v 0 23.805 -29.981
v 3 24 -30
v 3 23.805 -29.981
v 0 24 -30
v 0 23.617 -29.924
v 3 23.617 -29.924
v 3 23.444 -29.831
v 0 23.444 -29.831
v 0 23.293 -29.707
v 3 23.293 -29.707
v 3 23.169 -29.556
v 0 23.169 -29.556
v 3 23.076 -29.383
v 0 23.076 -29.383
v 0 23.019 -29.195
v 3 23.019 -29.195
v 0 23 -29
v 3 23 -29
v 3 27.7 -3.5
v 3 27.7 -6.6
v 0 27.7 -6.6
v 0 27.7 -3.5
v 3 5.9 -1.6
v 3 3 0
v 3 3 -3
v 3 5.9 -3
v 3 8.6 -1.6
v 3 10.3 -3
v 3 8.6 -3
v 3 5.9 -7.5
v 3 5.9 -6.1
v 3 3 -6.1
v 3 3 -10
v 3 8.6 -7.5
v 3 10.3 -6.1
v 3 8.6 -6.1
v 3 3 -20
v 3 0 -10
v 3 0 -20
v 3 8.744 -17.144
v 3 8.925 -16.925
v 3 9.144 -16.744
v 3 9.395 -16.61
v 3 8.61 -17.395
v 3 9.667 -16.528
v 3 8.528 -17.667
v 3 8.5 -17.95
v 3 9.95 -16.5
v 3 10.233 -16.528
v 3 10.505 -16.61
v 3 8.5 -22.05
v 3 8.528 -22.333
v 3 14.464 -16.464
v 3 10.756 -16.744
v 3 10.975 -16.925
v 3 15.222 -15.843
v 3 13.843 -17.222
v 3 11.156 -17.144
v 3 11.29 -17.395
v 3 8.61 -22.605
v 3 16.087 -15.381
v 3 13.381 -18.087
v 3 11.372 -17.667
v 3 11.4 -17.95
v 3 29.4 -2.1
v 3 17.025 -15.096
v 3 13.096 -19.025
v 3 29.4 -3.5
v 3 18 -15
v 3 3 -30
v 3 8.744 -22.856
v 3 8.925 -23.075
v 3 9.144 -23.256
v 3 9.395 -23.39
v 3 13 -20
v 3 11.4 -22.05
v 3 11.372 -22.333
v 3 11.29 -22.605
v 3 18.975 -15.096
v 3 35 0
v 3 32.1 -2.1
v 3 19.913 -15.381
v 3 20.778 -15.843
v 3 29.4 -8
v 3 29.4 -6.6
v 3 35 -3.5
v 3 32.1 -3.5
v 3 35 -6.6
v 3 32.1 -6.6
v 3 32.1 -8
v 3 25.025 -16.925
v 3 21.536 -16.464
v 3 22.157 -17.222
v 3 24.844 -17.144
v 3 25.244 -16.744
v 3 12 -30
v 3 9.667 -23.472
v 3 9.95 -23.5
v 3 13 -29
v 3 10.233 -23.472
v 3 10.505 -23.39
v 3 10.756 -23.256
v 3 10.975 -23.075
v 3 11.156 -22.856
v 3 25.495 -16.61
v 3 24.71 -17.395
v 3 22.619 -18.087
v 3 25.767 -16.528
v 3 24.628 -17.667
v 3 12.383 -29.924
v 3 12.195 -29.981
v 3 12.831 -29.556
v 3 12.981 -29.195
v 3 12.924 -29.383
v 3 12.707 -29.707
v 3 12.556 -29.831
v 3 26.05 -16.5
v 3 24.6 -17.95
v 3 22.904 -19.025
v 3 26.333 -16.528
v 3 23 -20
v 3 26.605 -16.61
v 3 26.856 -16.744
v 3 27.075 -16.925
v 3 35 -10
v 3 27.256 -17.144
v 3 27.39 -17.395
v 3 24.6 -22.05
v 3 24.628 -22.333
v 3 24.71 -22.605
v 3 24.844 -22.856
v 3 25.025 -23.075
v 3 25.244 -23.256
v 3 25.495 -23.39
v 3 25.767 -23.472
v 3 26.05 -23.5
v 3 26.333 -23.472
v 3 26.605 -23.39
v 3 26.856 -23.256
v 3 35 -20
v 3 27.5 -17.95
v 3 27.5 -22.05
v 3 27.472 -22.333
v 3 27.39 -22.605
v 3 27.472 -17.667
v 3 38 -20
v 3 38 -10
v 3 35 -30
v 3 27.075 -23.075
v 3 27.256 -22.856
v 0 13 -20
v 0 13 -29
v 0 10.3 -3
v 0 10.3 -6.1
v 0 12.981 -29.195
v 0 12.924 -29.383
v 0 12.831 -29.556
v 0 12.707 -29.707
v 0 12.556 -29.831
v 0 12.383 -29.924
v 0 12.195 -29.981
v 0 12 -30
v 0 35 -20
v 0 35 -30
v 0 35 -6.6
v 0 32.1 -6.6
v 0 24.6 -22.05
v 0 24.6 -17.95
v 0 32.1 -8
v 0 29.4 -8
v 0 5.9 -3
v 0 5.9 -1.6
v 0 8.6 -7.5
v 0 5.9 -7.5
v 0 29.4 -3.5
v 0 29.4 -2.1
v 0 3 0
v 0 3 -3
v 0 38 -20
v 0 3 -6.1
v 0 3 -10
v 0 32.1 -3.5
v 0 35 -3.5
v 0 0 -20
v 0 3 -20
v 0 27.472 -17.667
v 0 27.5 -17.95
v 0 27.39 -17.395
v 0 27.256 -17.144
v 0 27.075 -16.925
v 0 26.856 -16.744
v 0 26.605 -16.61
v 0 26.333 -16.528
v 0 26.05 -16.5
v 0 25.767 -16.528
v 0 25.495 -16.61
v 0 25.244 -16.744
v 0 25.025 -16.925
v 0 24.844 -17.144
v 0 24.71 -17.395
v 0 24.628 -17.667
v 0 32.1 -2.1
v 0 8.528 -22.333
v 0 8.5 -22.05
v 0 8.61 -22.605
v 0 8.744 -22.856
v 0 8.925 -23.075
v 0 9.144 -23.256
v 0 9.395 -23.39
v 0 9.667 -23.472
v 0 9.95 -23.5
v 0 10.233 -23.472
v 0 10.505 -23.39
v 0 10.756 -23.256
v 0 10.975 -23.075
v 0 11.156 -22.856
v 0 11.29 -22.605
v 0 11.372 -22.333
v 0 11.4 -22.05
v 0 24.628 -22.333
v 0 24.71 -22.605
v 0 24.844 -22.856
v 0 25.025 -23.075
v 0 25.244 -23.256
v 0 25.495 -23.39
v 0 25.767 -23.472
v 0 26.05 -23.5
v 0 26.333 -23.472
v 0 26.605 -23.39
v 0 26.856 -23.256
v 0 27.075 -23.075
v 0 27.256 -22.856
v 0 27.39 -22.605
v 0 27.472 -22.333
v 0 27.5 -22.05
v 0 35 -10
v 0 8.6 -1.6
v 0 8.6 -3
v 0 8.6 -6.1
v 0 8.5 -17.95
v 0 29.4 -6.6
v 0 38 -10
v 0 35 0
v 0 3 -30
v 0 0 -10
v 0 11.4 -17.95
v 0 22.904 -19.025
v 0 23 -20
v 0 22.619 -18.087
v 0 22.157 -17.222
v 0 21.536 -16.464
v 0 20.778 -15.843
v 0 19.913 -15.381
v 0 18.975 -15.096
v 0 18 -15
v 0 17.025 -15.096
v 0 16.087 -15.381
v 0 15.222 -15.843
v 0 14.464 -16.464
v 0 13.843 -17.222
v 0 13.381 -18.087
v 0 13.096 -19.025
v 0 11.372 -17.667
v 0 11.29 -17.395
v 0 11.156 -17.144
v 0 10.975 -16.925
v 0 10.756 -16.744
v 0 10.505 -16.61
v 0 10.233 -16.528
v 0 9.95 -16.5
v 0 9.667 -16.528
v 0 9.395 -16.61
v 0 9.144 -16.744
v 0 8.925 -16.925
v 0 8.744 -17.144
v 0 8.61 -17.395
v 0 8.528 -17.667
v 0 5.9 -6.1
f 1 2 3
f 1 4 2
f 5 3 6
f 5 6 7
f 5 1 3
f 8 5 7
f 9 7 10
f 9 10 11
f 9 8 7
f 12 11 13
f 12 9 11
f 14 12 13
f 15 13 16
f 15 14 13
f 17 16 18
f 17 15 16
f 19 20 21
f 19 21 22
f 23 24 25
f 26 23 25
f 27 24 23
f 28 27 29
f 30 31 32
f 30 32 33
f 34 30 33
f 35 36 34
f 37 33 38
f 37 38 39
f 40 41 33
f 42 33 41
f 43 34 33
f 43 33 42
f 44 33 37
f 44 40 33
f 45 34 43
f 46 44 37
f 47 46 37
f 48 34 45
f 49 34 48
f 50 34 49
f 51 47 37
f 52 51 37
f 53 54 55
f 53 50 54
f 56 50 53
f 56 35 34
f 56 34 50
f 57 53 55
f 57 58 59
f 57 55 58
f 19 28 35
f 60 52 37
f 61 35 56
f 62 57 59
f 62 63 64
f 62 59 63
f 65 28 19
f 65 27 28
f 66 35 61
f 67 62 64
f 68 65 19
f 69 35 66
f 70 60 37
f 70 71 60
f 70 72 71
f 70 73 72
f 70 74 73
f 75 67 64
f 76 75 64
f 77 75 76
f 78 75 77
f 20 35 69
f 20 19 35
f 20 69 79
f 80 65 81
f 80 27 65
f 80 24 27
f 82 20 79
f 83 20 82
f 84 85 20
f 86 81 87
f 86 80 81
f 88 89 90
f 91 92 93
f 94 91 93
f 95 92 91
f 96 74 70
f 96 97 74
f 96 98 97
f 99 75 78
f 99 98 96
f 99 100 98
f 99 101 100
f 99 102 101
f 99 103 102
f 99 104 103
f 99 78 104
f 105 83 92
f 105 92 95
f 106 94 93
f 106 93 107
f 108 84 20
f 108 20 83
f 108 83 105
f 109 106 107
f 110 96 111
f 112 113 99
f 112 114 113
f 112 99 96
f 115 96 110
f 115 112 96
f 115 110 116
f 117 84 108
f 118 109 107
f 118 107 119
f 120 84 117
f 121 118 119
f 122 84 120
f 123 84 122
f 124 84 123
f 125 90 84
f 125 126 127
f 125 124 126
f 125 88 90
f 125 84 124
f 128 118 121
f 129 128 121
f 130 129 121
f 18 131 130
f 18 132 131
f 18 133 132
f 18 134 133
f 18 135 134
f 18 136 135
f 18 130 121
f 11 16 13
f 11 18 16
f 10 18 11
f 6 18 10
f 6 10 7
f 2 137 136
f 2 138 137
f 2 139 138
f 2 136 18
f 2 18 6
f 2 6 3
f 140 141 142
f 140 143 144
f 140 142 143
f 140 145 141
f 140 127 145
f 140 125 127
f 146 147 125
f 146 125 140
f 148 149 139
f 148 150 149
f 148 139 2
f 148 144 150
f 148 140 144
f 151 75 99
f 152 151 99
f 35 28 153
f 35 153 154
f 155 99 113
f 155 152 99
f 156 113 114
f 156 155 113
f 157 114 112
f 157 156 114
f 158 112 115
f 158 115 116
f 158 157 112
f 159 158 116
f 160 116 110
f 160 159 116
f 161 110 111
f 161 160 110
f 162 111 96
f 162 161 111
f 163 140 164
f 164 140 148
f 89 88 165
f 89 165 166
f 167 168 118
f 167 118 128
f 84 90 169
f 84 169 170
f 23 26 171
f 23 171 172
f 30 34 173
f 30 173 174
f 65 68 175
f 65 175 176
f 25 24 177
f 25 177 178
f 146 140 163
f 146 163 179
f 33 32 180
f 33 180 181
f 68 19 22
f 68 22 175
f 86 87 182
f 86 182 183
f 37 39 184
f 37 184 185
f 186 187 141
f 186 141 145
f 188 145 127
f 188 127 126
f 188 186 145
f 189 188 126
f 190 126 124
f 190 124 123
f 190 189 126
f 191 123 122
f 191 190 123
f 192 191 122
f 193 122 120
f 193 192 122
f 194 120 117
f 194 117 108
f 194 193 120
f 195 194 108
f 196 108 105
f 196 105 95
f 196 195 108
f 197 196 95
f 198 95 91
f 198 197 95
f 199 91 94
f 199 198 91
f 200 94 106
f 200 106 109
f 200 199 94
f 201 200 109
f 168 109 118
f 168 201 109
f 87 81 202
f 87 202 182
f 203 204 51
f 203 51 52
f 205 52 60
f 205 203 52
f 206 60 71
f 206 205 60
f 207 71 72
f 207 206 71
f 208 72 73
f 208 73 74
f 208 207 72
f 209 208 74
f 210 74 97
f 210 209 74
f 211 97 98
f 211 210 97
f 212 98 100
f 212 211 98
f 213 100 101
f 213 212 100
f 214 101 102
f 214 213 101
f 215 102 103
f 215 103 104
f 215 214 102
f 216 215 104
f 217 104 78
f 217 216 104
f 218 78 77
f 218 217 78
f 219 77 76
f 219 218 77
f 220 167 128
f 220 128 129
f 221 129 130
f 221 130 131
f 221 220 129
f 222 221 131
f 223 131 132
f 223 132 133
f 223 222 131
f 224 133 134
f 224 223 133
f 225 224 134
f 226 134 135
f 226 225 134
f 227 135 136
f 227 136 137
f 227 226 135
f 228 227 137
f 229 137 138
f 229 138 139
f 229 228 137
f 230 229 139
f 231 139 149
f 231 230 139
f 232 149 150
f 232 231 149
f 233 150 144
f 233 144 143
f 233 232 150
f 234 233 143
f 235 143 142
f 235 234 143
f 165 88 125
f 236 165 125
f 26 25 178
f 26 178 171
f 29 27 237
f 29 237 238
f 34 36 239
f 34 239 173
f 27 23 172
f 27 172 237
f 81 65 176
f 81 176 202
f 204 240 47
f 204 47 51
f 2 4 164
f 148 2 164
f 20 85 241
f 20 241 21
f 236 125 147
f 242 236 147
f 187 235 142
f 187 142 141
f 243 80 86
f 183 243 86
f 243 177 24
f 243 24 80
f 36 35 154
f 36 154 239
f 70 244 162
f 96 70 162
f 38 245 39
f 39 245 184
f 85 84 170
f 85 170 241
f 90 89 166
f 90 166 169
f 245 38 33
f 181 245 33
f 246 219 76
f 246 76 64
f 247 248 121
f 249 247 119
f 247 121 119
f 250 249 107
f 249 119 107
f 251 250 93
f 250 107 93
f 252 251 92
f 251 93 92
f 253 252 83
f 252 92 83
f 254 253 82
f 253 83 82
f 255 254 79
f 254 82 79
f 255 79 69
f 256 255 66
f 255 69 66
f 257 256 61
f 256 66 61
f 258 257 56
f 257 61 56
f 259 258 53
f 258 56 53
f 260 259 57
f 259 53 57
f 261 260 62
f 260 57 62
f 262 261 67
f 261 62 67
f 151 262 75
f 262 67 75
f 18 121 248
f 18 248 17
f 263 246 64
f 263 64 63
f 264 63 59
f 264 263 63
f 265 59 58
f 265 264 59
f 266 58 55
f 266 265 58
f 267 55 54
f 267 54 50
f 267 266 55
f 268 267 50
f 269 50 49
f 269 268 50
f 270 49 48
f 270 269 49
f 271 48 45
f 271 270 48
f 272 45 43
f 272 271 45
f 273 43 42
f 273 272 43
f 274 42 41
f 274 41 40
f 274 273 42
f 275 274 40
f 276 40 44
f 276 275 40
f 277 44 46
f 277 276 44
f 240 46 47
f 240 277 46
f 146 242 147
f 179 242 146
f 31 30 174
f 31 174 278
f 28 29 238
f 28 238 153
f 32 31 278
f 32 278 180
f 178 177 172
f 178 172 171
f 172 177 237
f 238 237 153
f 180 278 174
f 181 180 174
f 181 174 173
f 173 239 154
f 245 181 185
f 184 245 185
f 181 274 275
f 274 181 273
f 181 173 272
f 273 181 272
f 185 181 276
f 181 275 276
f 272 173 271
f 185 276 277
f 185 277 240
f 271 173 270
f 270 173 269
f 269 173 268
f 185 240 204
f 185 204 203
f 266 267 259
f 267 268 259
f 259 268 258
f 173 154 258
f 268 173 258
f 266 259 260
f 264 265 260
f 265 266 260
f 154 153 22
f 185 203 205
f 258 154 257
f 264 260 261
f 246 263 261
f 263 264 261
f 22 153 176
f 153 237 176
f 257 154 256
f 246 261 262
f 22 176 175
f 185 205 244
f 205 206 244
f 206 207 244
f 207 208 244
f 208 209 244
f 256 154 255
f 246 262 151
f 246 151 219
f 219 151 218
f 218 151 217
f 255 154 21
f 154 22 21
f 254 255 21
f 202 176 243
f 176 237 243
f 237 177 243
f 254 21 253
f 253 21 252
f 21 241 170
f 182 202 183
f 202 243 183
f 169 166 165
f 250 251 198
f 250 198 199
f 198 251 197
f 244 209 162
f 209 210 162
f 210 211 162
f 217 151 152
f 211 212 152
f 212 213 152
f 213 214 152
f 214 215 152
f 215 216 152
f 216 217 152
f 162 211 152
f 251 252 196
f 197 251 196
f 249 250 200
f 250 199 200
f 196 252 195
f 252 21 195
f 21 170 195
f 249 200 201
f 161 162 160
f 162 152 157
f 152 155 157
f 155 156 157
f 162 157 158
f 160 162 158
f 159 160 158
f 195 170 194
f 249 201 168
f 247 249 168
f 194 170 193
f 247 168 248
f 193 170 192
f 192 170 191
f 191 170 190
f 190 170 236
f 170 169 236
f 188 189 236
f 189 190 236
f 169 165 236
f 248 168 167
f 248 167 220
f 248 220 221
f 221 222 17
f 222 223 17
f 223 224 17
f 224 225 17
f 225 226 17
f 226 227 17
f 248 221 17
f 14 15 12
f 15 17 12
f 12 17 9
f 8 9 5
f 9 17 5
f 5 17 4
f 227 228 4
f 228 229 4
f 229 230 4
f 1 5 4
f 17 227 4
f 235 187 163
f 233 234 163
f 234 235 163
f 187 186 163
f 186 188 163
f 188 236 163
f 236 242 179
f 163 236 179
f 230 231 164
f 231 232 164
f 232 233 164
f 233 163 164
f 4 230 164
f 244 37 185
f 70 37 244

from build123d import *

# Parameters (mm, degrees)
SKETCH1_W                  = 30
SKETCH1_H                  = 38
BOSS_EXTRUDE1_DEPTH        = 3
SKETCH2_R                  = 5
CUT_EXTRUDE1_DEPTH         = 3
SKETCH6_W                  = 10
SKETCH6_H                  = 3
CUT_EXTRUDE2_DEPTH         = 3
CUT_EXTRUDE3_DEPTH         = 3
SKETCH9_W                  = 10
SKETCH9_H                  = 3
CUT_EXTRUDE5_DEPTH         = 10
CUT_EXTRUDE6_DEPTH         = 10
M2_5_CLEARANCE_SLOT1_DEPTH = 3
SKETCH17_W                 = 10
SKETCH17_H                 = 10
CUT_EXTRUDE7_DEPTH         = 10
FILLET1_R                  = 1


# Read off the part's stored shape, not the designer's step: M2.5 Clearance Slot1
with BuildPart() as part:
    # Sketch1 → Boss-Extrude1 (new body)
    with BuildSketch(Plane(origin=(0, 0, 0), x_dir=(0, 0, -1), z_dir=(1, 0, 0))):
        with Locations((15, 19)):
            Rectangle(SKETCH1_W, SKETCH1_H)
    extrude(amount=BOSS_EXTRUDE1_DEPTH)

    # Sketch2 → Cut-Extrude1 (cut)
    with BuildSketch(Plane(origin=(3, 0, 0), x_dir=(0, 0, -1), z_dir=(1, 0, 0))):
        with Locations((20, 18)):
            Circle(SKETCH2_R)
    extrude(amount=-CUT_EXTRUDE1_DEPTH, mode=Mode.SUBTRACT)

    # Sketch6 → Cut-Extrude2 (cut)
    with BuildSketch(Plane(origin=(3, 0, 0), x_dir=(0, 0, -1), z_dir=(1, 0, 0))):
        with Locations((5, 1.5)):
            Rectangle(SKETCH6_W, SKETCH6_H)
        with Locations((25, 1.5)):
            Rectangle(SKETCH6_W, SKETCH6_H)
    extrude(amount=-CUT_EXTRUDE2_DEPTH, mode=Mode.SUBTRACT)

    # Sketch7 → Cut-Extrude3 (cut)
    with BuildSketch(Plane(origin=(3, 0, 0), x_dir=(0, 0, -1), z_dir=(1, 0, 0))):
        Polygon((3, 3), (3, 5.9), (1.6, 5.9), (1.6, 8.6), (3, 8.6), (3, 10.3), (6.1, 10.3), (6.1, 8.6), (7.5, 8.6), (7.5, 5.9), (6.1, 5.9), (6.1, 3), align=None)
    extrude(amount=-CUT_EXTRUDE3_DEPTH, mode=Mode.SUBTRACT)

    # Sketch9 → Cut-Extrude5 (cut)
    with BuildSketch(Plane(origin=(3, 0, 0), x_dir=(0, 0, -1), z_dir=(1, 0, 0))):
        with Locations((5, 36.5)):
            Rectangle(SKETCH9_W, SKETCH9_H)
        with Locations((25, 36.5)):
            Rectangle(SKETCH9_W, SKETCH9_H)
    extrude(amount=-CUT_EXTRUDE5_DEPTH, mode=Mode.SUBTRACT)

    # Sketch12 → Cut-Extrude6 (cut)
    with BuildSketch(Plane(origin=(3, 0, 0), x_dir=(0, 0, -1), z_dir=(1, 0, 0))):
        Polygon((6.6, 35), (6.6, 32.1), (8, 32.1), (8, 29.4), (6.6, 29.4), (6.6, 27.7), (3.5, 27.7), (3.5, 29.4), (2.1, 29.4), (2.1, 32.1), (3.5, 32.1), (3.5, 35), align=None)
    extrude(amount=-CUT_EXTRUDE6_DEPTH, mode=Mode.SUBTRACT)

    # M2.5 Clearance Slot1 outline → M2.5 Clearance Slot1 (cut)
    with BuildSketch(Plane.YZ):
        with BuildLine():
            Line((11.4, -22.05), (11.4, -17.95))
            ThreePointArc((11.4, -17.95), (9.95, -16.5), (8.5, -17.95))
            Line((8.5, -17.95), (8.5, -22.05))
            ThreePointArc((8.5, -22.05), (9.95, -23.5), (11.4, -22.05))
        make_face()
        with BuildLine():
            Line((27.5, -22.05), (27.5, -17.95))
            ThreePointArc((27.5, -17.95), (26.05, -16.5), (24.6, -17.95))
            Line((24.6, -17.95), (24.6, -22.05))
            ThreePointArc((24.6, -22.05), (26.05, -23.5), (27.5, -22.05))
        make_face()
    extrude(amount=M2_5_CLEARANCE_SLOT1_DEPTH, mode=Mode.SUBTRACT)

    # Sketch17 → Cut-Extrude7 (cut)
    with BuildSketch(Plane(origin=(3, 0, 0), x_dir=(0, 0, -1), z_dir=(1, 0, 0))):
        with Locations((25, 18)):
            Rectangle(SKETCH17_W, SKETCH17_H)
    extrude(amount=-CUT_EXTRUDE7_DEPTH, mode=Mode.SUBTRACT)

    # Fillet1
    fillet1_edges = [part.edges().sort_by_distance(p)[0] for p in [
        (1.5, 23, -30),
        (1.5, 13, -30),
    ]]
    fillet(fillet1_edges, radius=FILLET1_R)


solid = part.part
